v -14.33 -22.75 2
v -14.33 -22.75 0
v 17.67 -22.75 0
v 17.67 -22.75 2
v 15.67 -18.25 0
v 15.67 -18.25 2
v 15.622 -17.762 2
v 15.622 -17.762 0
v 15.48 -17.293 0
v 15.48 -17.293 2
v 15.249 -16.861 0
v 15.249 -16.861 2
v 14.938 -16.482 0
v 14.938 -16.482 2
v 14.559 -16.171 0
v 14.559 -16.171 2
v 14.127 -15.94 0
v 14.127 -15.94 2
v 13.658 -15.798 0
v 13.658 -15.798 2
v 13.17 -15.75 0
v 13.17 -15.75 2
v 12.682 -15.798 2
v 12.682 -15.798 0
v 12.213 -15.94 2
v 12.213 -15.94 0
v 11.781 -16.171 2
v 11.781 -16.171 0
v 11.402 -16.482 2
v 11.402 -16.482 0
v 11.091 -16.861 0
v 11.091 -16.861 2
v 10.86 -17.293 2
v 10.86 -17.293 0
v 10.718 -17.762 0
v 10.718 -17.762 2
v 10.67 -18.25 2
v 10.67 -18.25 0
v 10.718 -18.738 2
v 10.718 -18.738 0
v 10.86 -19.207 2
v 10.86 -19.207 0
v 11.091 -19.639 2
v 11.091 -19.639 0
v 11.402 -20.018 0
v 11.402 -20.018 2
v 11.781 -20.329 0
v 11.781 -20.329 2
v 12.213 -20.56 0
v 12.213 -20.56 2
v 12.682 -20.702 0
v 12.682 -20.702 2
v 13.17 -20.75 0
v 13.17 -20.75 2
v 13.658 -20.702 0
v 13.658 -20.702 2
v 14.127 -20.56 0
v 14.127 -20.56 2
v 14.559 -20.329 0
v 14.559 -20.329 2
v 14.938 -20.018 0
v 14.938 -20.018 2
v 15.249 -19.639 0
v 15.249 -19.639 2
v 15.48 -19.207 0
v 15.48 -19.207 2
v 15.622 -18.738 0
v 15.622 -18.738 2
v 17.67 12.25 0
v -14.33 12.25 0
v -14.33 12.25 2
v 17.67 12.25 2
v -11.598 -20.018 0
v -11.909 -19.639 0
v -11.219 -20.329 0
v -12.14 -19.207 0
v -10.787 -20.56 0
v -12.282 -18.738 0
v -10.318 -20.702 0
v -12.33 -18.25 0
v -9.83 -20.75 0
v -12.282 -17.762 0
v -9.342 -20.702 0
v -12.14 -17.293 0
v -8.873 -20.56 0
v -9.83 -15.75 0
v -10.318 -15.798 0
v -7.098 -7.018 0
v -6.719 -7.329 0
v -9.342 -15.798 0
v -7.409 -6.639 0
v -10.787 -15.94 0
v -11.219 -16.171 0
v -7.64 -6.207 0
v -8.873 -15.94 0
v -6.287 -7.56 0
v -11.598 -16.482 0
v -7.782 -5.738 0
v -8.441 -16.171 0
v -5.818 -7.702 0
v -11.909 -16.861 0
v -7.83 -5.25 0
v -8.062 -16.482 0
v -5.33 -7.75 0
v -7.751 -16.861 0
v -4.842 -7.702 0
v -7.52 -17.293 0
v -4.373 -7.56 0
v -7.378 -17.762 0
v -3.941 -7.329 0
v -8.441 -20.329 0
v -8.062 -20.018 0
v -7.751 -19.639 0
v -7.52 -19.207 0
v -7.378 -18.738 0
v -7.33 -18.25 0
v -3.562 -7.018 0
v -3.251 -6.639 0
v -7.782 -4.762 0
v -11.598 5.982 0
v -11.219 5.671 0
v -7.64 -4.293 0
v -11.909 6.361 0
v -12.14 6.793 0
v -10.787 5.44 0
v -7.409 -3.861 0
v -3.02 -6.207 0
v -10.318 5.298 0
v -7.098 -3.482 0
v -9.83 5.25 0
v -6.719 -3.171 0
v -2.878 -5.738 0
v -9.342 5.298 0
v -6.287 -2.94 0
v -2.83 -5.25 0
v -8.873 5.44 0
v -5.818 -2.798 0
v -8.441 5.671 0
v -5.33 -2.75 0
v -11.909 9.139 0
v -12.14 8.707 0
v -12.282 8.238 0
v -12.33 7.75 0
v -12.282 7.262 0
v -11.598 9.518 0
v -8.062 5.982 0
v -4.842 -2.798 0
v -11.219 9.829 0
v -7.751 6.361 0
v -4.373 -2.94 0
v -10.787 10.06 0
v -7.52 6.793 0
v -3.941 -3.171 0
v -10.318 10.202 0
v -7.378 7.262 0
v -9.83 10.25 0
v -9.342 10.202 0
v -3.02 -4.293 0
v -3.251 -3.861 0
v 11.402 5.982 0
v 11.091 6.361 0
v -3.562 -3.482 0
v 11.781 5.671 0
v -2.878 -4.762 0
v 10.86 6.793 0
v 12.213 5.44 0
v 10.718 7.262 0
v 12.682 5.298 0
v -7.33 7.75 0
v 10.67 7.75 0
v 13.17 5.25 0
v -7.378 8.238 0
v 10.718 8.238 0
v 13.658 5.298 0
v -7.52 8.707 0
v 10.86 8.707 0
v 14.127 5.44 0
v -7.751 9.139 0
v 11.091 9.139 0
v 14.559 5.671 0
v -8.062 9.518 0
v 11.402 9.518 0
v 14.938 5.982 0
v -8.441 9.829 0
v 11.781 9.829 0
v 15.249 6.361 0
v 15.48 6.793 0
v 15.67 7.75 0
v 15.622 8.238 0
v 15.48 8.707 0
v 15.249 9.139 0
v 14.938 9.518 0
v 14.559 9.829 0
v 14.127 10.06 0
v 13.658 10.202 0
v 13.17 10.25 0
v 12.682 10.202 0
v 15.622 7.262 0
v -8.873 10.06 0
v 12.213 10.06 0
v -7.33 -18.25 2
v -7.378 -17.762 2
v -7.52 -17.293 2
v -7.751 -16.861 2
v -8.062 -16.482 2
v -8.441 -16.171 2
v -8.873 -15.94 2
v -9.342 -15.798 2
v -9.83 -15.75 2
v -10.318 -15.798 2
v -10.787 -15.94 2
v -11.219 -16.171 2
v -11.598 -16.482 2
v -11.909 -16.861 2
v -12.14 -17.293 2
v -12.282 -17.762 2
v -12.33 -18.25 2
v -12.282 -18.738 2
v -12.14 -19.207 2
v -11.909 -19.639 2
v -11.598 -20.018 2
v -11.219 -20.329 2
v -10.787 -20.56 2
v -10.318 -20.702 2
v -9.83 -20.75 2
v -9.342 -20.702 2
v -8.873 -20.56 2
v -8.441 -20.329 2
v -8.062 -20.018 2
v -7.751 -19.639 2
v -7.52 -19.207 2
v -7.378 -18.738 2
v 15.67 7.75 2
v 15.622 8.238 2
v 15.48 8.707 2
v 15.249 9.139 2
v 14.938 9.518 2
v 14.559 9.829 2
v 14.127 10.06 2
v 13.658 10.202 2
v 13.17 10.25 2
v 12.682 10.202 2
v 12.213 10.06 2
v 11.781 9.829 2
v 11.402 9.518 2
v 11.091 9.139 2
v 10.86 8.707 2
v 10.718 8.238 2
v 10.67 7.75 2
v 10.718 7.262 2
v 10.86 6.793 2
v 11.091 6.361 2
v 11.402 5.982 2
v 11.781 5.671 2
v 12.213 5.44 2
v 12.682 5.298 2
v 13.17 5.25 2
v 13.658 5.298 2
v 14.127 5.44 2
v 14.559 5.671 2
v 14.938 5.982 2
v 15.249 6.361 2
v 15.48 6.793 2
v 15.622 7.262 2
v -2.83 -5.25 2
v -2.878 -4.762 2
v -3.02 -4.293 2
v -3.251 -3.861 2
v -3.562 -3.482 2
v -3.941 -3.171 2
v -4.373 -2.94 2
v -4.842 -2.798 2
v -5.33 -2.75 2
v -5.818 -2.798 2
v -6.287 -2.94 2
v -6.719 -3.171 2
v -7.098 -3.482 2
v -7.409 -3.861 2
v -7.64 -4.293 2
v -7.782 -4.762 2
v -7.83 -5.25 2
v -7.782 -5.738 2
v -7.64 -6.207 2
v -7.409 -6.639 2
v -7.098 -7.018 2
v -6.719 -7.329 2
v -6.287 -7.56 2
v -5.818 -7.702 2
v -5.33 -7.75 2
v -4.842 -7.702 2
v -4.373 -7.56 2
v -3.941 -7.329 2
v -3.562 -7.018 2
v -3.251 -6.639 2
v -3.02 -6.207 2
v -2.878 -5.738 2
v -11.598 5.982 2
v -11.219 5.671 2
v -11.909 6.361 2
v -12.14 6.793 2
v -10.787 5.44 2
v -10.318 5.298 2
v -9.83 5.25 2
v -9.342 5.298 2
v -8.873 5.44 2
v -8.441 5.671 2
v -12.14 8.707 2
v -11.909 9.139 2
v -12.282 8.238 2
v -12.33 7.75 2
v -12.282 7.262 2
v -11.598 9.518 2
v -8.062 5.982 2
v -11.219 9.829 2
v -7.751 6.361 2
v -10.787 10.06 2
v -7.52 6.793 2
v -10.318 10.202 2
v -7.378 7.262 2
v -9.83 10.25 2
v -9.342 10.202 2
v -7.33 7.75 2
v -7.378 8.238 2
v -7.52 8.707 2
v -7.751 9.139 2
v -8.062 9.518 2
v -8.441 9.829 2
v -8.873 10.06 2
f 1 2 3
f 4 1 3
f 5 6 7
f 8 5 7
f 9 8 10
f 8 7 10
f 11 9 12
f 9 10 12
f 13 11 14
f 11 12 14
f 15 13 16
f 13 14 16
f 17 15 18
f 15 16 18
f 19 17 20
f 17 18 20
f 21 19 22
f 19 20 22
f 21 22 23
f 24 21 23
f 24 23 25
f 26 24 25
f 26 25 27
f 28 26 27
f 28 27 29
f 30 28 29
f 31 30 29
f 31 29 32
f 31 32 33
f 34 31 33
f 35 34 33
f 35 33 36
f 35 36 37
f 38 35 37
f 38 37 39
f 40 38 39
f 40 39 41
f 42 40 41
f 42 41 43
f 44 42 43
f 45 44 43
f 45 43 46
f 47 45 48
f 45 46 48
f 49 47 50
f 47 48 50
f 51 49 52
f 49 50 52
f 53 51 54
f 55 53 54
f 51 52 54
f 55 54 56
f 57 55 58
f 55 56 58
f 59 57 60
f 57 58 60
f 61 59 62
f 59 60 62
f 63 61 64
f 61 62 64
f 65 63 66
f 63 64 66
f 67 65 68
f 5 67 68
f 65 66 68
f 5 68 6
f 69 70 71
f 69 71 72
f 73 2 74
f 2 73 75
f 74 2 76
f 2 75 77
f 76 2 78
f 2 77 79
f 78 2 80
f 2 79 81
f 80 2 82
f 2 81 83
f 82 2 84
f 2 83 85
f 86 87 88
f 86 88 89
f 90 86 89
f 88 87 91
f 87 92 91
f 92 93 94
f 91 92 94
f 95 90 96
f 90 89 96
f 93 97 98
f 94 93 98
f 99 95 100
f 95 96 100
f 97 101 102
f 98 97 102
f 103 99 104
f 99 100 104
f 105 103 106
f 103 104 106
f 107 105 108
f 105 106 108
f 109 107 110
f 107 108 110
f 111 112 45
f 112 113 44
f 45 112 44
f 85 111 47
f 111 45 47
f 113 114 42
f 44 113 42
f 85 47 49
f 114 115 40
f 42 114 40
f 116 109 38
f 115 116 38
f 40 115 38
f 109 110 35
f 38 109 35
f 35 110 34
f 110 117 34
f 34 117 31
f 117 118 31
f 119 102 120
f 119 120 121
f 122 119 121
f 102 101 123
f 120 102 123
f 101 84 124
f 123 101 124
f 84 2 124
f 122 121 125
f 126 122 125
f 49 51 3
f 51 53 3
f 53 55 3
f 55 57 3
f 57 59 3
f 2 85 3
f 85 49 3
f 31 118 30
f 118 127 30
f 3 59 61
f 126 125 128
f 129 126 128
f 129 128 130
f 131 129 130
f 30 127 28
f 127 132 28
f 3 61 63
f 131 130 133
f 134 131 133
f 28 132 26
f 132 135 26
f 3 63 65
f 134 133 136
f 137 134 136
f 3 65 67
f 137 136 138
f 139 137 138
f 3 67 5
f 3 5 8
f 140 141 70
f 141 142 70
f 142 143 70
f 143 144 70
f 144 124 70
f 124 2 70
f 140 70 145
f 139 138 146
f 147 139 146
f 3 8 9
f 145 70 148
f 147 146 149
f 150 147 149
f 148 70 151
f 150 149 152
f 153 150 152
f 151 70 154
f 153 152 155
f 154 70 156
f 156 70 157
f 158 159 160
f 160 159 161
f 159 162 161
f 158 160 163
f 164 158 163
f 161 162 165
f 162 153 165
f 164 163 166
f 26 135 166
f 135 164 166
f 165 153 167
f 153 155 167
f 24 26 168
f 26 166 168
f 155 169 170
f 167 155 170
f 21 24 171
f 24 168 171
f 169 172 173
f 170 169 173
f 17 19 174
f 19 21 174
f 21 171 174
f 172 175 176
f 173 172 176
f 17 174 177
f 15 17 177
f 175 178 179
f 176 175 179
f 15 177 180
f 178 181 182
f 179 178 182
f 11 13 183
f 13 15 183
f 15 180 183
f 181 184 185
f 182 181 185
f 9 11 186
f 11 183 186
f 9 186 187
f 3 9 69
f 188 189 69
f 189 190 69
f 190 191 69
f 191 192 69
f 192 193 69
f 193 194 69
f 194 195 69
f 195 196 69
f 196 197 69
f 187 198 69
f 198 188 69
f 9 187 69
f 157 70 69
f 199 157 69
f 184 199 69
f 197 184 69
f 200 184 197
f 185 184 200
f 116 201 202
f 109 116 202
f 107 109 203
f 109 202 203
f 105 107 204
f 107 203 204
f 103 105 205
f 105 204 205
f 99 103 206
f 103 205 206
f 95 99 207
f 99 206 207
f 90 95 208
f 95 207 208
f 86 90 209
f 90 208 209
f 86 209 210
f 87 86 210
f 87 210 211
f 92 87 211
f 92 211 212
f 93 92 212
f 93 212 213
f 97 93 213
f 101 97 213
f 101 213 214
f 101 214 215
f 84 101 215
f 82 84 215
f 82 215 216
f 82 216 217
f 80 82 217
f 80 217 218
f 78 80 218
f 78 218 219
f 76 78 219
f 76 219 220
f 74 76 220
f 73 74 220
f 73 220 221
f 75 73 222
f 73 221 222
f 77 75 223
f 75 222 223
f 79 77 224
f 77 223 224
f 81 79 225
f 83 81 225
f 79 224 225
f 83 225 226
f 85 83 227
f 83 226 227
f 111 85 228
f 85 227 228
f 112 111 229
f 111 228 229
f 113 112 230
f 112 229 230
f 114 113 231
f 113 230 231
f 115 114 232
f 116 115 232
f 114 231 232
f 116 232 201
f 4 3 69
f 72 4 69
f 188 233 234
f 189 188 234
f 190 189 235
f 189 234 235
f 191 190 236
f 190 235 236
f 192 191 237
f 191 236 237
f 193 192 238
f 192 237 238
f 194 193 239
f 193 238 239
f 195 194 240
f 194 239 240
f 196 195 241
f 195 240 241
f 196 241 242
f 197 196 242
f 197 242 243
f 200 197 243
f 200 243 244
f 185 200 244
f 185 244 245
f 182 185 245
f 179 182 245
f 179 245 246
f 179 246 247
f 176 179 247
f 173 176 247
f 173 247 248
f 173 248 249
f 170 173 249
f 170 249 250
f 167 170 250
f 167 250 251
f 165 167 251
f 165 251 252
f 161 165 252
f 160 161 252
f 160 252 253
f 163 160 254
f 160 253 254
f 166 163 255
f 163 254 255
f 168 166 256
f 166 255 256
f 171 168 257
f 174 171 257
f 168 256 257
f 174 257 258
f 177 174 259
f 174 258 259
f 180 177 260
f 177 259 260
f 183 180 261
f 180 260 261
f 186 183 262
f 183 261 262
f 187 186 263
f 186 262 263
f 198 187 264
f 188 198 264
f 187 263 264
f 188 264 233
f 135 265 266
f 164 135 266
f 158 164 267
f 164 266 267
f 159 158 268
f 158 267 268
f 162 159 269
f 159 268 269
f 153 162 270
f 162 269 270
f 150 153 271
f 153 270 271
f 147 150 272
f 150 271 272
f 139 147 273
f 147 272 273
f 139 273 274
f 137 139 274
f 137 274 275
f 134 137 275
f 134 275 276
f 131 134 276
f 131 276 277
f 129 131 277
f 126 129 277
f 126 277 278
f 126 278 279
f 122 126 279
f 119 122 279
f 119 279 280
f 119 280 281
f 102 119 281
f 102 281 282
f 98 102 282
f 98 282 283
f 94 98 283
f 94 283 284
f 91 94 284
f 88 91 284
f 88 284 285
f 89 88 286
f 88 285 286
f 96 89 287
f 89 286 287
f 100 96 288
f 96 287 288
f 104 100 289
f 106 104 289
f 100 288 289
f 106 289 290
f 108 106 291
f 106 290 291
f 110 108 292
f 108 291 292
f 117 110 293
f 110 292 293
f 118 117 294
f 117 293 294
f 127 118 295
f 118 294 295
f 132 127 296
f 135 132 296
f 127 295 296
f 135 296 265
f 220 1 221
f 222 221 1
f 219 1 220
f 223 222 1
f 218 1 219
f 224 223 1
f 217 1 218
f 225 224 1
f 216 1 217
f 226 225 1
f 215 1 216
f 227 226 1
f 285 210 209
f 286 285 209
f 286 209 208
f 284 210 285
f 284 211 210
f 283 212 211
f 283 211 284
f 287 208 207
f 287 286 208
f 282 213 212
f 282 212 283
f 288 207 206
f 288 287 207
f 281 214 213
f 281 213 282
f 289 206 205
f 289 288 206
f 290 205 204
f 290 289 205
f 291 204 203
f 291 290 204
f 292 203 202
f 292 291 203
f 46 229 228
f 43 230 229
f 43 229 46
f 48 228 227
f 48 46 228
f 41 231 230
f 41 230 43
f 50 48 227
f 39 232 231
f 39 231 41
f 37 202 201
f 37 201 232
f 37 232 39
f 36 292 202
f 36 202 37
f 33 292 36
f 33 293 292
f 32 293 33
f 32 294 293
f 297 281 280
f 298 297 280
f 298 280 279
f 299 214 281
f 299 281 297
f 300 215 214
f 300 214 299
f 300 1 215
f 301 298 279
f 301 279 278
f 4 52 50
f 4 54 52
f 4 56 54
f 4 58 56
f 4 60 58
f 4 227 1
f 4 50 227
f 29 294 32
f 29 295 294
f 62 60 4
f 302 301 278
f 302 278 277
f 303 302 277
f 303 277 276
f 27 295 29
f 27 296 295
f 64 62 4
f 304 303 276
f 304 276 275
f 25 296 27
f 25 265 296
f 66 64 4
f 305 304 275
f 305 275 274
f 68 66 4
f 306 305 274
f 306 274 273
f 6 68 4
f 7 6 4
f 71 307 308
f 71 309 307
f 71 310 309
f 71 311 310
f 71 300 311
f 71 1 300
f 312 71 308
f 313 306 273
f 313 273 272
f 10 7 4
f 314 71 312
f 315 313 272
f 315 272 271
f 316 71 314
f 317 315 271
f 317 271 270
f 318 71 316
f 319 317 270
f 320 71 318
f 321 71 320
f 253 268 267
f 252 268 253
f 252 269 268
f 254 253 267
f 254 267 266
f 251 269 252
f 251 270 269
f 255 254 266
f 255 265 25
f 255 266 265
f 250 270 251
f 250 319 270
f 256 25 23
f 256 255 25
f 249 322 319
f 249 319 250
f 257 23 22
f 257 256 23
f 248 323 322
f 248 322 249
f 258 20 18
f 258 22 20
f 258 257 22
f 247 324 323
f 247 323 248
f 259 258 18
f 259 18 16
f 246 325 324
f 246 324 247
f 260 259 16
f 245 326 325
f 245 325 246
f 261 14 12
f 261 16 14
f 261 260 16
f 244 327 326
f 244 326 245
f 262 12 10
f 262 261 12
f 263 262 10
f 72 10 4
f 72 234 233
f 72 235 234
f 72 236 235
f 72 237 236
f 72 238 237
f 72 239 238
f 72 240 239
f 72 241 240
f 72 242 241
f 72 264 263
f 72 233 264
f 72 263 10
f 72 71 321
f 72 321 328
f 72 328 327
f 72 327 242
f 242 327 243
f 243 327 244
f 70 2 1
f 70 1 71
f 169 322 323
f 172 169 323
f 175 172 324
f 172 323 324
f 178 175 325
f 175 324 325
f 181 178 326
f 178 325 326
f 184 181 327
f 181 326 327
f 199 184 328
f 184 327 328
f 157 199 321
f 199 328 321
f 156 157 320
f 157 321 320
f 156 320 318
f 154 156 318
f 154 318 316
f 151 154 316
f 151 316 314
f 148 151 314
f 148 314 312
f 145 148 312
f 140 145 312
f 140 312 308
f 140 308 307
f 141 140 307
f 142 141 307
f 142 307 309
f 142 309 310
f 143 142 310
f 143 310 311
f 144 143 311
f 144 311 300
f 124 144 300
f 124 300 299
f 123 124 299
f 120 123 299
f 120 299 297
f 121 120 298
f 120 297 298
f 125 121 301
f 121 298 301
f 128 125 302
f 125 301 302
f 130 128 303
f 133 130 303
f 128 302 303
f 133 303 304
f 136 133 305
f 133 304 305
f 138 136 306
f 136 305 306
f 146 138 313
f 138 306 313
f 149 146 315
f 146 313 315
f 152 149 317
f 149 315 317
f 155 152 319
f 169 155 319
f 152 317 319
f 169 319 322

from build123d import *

# Parameters (mm, degrees)
SKETCH1_W           = 32
SKETCH1_H           = 35
BOSS_EXTRUDE1_DEPTH = 2
M6_TAPPED_HOLE3_D   = 5
M6_TAPPED_HOLE4_D   = 5


with BuildPart() as part:
    # Sketch1 → Boss-Extrude1 (new body)
    with BuildSketch(Plane.XY):
        with Locations((1.67, -5.25)):
            Rectangle(SKETCH1_W, SKETCH1_H)
    extrude(amount=BOSS_EXTRUDE1_DEPTH)

    # M6 Tapped Hole3 (through all)
    with Locations(Plane(origin=(0, 0, 0), x_dir=(-1, 0, 0), z_dir=(0, 0, -1))):
        with Locations((9.83, -18.25), (-13.17, -18.25), (-13.17, 7.75), (9.83, 7.75)):
            Hole(M6_TAPPED_HOLE3_D / 2)

    # M6 Tapped Hole4 (through all)
    with Locations(Plane(origin=(0, 0, 0), x_dir=(-1, 0, 0), z_dir=(0, 0, -1))):
        with Locations((5.33, -5.25)):
            Hole(M6_TAPPED_HOLE4_D / 2)


solid = part.part
